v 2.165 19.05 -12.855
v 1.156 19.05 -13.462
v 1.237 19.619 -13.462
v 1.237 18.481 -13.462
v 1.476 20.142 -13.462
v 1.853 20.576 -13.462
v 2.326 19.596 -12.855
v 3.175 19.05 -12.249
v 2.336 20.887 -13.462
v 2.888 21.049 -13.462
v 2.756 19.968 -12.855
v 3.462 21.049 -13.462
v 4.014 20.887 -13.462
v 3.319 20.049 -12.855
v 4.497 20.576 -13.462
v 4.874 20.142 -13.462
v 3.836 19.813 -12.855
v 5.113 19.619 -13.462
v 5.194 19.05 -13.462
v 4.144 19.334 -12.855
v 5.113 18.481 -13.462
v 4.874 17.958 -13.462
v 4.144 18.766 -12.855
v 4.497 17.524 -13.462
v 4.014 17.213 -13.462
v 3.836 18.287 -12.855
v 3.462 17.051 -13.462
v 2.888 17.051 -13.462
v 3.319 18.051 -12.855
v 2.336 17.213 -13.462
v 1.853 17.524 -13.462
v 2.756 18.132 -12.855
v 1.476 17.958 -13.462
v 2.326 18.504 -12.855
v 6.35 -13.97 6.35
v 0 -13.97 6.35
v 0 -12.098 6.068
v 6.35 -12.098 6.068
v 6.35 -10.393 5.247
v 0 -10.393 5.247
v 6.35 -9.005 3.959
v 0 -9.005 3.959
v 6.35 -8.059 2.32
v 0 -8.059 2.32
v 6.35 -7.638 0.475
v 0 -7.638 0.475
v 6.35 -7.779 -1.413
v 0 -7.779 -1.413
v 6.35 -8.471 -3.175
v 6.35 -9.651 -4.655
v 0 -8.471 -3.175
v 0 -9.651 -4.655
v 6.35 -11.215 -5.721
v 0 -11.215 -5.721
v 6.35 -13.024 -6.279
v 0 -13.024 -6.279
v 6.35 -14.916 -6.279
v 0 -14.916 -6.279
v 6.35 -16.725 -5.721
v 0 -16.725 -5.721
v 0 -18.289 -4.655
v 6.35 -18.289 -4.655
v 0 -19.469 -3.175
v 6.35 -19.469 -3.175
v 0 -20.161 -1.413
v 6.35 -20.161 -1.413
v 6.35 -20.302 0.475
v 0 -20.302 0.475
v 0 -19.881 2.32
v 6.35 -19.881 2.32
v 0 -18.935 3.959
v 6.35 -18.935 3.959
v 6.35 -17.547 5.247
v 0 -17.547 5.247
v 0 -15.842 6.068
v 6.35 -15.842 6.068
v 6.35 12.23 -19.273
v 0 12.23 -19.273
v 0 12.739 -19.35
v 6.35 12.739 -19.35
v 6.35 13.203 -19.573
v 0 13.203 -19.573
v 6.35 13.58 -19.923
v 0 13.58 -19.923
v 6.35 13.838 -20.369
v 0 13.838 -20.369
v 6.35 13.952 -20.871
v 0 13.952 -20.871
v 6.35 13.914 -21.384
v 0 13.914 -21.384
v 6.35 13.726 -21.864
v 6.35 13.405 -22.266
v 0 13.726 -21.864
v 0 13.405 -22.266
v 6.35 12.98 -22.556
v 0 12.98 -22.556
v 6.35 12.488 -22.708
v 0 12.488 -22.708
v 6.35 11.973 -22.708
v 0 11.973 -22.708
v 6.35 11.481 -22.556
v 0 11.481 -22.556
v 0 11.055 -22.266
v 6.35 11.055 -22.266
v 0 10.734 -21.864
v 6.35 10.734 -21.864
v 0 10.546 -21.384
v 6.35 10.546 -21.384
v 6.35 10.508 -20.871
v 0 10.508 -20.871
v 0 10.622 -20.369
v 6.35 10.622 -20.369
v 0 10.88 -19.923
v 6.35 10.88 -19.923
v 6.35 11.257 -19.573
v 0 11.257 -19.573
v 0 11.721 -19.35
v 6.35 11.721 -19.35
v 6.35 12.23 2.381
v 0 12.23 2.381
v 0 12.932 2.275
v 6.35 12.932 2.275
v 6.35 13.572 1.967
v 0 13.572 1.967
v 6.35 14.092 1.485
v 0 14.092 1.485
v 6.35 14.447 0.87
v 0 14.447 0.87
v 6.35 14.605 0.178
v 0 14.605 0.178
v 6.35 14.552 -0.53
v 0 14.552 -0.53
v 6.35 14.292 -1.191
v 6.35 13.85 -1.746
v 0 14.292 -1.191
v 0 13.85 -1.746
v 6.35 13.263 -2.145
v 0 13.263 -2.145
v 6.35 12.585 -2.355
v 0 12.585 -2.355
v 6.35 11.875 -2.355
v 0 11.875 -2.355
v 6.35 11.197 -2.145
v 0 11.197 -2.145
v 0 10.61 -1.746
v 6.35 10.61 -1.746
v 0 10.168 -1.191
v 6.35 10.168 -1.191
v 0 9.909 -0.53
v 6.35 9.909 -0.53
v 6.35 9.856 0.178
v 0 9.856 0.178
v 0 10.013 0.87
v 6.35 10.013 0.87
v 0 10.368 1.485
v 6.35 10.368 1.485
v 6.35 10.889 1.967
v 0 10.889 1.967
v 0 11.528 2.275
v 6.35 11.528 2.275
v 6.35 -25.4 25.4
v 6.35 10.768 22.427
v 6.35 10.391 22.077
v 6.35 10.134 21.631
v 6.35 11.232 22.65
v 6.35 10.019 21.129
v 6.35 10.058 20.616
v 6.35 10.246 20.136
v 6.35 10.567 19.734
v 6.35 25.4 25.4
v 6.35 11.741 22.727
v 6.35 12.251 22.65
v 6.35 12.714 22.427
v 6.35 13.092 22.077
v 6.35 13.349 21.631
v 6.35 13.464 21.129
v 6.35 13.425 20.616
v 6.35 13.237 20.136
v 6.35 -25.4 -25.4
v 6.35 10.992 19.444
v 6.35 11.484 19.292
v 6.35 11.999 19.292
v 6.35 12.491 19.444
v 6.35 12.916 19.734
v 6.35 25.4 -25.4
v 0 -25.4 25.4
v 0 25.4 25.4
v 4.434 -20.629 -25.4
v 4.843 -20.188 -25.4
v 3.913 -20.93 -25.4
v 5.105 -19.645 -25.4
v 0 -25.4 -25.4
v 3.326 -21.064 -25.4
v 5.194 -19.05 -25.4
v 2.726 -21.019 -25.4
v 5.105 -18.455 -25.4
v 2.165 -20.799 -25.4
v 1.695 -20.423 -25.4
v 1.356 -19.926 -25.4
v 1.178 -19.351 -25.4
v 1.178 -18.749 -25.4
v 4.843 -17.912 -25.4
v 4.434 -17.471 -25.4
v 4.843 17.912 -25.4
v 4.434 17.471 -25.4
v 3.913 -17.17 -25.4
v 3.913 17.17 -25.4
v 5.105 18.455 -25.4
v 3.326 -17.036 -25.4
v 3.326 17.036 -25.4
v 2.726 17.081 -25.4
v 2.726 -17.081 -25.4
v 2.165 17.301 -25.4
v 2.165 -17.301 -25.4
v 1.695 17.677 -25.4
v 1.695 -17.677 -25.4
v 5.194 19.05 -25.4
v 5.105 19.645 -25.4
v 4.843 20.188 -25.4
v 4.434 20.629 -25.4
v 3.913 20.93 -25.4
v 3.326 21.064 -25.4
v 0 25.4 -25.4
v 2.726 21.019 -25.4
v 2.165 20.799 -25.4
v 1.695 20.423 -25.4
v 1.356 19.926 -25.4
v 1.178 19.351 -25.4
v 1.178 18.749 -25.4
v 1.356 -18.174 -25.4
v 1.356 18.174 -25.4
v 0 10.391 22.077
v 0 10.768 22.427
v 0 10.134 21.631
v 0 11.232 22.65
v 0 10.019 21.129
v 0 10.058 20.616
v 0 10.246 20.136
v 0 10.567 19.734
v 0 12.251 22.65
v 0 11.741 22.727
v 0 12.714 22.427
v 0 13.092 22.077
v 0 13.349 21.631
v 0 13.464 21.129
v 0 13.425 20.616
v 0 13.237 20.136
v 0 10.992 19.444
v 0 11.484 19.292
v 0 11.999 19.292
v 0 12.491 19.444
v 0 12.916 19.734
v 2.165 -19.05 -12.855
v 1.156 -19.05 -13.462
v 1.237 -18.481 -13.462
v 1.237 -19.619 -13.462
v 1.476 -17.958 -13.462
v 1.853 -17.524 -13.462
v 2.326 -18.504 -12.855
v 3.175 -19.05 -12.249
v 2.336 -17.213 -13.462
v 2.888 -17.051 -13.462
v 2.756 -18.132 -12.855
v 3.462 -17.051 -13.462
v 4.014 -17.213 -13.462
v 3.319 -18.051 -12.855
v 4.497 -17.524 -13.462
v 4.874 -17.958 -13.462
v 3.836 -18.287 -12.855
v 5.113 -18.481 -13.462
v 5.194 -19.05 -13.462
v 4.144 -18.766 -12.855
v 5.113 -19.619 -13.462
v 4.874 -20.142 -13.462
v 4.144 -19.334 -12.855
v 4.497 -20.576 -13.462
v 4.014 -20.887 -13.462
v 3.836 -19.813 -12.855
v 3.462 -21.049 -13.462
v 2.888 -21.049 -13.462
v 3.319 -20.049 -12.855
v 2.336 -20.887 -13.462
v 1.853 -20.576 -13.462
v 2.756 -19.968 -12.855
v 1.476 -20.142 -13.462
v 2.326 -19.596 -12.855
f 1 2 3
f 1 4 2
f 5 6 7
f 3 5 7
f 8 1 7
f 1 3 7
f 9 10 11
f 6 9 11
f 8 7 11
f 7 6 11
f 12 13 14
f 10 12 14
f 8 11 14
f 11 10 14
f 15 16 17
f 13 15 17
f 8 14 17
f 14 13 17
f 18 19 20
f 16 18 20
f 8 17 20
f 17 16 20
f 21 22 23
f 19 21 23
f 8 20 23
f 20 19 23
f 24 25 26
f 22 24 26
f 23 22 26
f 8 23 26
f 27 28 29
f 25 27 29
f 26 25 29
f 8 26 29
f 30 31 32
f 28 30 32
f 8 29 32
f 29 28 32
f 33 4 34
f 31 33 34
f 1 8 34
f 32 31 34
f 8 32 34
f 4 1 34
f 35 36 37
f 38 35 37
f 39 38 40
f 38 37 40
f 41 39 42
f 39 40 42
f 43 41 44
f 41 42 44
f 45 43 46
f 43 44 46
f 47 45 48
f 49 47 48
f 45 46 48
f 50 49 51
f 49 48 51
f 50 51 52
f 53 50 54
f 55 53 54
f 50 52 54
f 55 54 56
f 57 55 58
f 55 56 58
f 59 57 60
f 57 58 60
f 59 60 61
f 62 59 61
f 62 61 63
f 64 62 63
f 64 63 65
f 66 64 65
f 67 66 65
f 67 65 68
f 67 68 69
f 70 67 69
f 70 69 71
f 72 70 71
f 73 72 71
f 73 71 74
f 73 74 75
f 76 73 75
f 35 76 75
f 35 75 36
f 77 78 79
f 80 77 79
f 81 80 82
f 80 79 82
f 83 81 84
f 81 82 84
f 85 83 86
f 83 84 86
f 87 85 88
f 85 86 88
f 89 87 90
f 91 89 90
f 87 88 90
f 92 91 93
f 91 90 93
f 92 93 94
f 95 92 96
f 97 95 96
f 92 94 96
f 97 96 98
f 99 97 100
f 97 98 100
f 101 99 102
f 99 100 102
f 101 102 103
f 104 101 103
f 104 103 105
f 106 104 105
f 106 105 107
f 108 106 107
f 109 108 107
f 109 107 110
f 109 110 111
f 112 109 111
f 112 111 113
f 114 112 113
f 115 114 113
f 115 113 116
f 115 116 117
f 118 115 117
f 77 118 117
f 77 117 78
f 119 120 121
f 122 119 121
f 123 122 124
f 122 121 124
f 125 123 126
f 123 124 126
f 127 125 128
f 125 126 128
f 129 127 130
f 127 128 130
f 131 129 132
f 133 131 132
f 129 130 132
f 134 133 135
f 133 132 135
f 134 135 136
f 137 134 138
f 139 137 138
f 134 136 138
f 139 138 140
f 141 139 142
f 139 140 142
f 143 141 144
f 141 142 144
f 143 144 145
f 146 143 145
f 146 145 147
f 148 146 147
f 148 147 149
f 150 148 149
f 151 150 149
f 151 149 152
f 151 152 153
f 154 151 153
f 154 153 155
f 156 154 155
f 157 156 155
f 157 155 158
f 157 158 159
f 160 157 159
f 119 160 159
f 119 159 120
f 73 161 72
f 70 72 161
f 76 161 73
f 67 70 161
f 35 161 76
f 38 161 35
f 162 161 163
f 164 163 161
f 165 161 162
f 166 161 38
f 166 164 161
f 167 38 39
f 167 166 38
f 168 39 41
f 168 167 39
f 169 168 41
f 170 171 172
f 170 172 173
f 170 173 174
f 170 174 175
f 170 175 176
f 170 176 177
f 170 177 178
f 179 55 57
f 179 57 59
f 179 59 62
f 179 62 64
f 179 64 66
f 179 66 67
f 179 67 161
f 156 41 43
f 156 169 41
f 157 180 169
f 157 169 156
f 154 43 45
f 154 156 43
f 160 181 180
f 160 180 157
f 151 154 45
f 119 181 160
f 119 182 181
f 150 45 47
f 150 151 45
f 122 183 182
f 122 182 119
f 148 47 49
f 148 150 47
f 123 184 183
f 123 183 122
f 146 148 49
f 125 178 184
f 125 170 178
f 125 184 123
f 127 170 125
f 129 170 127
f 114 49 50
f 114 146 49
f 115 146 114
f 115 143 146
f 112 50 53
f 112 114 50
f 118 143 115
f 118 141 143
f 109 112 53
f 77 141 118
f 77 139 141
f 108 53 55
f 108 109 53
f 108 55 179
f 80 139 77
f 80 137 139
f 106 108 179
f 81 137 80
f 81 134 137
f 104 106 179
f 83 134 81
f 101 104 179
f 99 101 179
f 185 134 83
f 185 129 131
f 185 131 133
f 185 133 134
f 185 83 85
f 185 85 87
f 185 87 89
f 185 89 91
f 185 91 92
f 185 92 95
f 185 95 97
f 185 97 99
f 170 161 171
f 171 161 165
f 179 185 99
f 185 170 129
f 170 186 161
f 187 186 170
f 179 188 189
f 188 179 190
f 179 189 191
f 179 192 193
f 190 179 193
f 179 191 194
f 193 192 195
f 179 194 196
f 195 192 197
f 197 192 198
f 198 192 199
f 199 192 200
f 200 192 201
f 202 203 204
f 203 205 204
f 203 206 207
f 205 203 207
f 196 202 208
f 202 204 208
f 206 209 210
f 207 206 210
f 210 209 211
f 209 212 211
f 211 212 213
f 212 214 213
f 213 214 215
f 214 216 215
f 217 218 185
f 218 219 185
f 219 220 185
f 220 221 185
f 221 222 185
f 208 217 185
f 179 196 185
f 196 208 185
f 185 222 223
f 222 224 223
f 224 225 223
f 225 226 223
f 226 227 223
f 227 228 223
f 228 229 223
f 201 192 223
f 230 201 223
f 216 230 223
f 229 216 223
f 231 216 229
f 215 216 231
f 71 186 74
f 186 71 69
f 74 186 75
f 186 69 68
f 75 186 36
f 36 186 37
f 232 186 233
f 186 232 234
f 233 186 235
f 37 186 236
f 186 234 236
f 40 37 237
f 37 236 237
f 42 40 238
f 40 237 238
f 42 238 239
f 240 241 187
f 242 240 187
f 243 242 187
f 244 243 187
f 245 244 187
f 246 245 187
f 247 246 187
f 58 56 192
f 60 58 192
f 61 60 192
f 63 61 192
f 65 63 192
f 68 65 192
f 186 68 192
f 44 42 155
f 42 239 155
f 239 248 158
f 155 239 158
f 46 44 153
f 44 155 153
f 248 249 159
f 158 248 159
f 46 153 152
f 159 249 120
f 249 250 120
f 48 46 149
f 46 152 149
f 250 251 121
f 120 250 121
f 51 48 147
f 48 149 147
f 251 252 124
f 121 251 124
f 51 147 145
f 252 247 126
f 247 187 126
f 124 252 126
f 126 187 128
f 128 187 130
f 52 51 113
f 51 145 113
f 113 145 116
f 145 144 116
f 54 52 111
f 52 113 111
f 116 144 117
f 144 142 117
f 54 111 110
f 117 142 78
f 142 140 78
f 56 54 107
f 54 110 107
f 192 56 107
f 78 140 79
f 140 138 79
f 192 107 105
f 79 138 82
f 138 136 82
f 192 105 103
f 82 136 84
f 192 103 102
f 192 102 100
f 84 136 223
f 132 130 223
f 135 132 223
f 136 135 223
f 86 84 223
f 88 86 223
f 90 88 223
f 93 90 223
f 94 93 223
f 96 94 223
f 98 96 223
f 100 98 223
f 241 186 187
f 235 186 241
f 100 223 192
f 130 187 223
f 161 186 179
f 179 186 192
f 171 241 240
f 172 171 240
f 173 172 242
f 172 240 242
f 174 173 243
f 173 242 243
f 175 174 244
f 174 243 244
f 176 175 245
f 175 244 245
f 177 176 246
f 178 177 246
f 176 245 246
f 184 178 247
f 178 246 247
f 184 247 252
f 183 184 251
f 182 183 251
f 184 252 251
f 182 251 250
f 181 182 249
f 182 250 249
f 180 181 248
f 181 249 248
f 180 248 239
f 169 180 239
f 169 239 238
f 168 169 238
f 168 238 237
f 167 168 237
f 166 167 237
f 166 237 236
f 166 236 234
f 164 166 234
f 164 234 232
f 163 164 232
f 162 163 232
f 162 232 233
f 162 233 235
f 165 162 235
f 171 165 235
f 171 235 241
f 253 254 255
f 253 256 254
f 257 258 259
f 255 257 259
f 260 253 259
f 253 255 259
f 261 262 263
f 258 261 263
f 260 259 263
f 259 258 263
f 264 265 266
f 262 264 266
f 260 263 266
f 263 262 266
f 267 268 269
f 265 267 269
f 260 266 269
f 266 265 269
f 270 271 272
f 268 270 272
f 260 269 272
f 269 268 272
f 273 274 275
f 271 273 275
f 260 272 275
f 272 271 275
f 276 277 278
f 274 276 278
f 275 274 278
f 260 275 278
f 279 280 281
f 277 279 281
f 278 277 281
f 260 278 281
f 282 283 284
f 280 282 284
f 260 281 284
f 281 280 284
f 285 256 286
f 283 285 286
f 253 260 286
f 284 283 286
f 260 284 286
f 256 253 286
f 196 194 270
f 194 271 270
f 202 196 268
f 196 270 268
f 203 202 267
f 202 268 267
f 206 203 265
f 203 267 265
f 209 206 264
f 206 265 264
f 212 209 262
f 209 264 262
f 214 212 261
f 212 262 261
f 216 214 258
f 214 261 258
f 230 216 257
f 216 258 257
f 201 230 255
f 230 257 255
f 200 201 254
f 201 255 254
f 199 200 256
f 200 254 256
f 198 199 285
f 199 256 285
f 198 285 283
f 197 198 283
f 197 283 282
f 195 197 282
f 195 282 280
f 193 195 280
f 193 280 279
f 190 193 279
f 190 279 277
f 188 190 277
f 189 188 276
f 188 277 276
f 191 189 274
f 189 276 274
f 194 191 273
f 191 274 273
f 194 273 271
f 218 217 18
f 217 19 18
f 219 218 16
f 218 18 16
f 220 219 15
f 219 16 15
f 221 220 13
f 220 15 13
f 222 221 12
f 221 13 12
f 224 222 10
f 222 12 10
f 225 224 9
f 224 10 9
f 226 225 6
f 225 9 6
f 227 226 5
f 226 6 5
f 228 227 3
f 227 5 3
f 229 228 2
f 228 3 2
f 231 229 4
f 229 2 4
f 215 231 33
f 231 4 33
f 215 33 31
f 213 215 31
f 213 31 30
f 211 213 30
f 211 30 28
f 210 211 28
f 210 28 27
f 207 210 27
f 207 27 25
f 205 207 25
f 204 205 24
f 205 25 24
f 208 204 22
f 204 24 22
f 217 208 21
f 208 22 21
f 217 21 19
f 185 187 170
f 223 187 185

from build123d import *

# Parameters (mm, degrees)
SKETCH1_W                          = 50.8
SKETCH1_H                          = 50.8
BOSS_EXTRUDE1_DEPTH                = 6.35
F_1_2_0_5_DIAMETER_HOLE1_D         = 12.7
F_1_2_0_5_DIAMETER_HOLE1_DEPTH     = 70.104
F_1_2_0_5_DIAMETER_HOLE1_TIP       = 3.815464931
F_3_16_0_1875_DIAMETER_HOLE1_D     = 4.7625
F_3_16_0_1875_DIAMETER_HOLE1_DEPTH = 70.104
F_3_16_0_1875_DIAMETER_HOLE1_TIP   = 1.430799349
F_29_0_136_DIAMETER_HOLE1_D        = 3.4544
F_29_0_136_DIAMETER_HOLE1_DEPTH    = 70.104
F_29_0_136_DIAMETER_HOLE1_TIP      = 1.037806461
F_10_32_TAPPED_HOLE1_D             = 4.0386
F_10_32_TAPPED_HOLE1_DEPTH         = 11.938
F_10_32_TAPPED_HOLE1_TIP           = 1.213317848


with BuildPart() as part:
    # Sketch1 → Boss-Extrude1 (new body)
    with BuildSketch(Plane(origin=(0, 0, 0), x_dir=(0, 0, -1), z_dir=(1, 0, 0))):
        Rectangle(SKETCH1_W, SKETCH1_H)
    extrude(amount=BOSS_EXTRUDE1_DEPTH)

    # 1/2 (0.5) Diameter Hole1
    with Locations(Plane(origin=(6.35, 0, 0), x_dir=(0, 0, -1), z_dir=(1, 0, 0))):
        with Locations((0, -13.97)):
            Hole(F_1_2_0_5_DIAMETER_HOLE1_D / 2, depth=F_1_2_0_5_DIAMETER_HOLE1_DEPTH)
            with Locations((0, 0, -(F_1_2_0_5_DIAMETER_HOLE1_DEPTH + F_1_2_0_5_DIAMETER_HOLE1_TIP / 2))):  # 118° drill point
                Cone(0, F_1_2_0_5_DIAMETER_HOLE1_D / 2, F_1_2_0_5_DIAMETER_HOLE1_TIP, mode=Mode.SUBTRACT)

    # 3/16 (0.1875) Diameter Hole1
    with Locations(Plane(origin=(6.35, 0, 0), x_dir=(0, 0, -1), z_dir=(1, 0, 0))):
        with Locations((0, 12.2301)):
            Hole(F_3_16_0_1875_DIAMETER_HOLE1_D / 2, depth=F_3_16_0_1875_DIAMETER_HOLE1_DEPTH)
            with Locations((0, 0, -(F_3_16_0_1875_DIAMETER_HOLE1_DEPTH + F_3_16_0_1875_DIAMETER_HOLE1_TIP / 2))):  # 118° drill point
                Cone(0, F_3_16_0_1875_DIAMETER_HOLE1_D / 2, F_3_16_0_1875_DIAMETER_HOLE1_TIP, mode=Mode.SUBTRACT)

    # #29 (0.136) Diameter Hole1
    with Locations(Plane(origin=(6.35, 0, 0), x_dir=(0, 0, -1), z_dir=(1, 0, 0))):
        with Locations((21, 12.2301), (-21, 11.74145915)):
            Hole(F_29_0_136_DIAMETER_HOLE1_D / 2, depth=F_29_0_136_DIAMETER_HOLE1_DEPTH)
            with Locations((0, 0, -(F_29_0_136_DIAMETER_HOLE1_DEPTH + F_29_0_136_DIAMETER_HOLE1_TIP / 2))):  # 118° drill point
                Cone(0, F_29_0_136_DIAMETER_HOLE1_D / 2, F_29_0_136_DIAMETER_HOLE1_TIP, mode=Mode.SUBTRACT)

    # #10-32 Tapped Hole1
    with Locations(Plane(origin=(-0.669296778, 7.980106856, -25.4), x_dir=(-1, 0, 0), z_dir=(0, 0, -1))):
        with Locations((-3.844296778, -27.030106856), (-3.844296778, 11.069893144)):
            Hole(F_10_32_TAPPED_HOLE1_D / 2, depth=F_10_32_TAPPED_HOLE1_DEPTH)
            with Locations((0, 0, -(F_10_32_TAPPED_HOLE1_DEPTH + F_10_32_TAPPED_HOLE1_TIP / 2))):  # 118° drill point
                Cone(0, F_10_32_TAPPED_HOLE1_D / 2, F_10_32_TAPPED_HOLE1_TIP, mode=Mode.SUBTRACT)


solid = part.part
